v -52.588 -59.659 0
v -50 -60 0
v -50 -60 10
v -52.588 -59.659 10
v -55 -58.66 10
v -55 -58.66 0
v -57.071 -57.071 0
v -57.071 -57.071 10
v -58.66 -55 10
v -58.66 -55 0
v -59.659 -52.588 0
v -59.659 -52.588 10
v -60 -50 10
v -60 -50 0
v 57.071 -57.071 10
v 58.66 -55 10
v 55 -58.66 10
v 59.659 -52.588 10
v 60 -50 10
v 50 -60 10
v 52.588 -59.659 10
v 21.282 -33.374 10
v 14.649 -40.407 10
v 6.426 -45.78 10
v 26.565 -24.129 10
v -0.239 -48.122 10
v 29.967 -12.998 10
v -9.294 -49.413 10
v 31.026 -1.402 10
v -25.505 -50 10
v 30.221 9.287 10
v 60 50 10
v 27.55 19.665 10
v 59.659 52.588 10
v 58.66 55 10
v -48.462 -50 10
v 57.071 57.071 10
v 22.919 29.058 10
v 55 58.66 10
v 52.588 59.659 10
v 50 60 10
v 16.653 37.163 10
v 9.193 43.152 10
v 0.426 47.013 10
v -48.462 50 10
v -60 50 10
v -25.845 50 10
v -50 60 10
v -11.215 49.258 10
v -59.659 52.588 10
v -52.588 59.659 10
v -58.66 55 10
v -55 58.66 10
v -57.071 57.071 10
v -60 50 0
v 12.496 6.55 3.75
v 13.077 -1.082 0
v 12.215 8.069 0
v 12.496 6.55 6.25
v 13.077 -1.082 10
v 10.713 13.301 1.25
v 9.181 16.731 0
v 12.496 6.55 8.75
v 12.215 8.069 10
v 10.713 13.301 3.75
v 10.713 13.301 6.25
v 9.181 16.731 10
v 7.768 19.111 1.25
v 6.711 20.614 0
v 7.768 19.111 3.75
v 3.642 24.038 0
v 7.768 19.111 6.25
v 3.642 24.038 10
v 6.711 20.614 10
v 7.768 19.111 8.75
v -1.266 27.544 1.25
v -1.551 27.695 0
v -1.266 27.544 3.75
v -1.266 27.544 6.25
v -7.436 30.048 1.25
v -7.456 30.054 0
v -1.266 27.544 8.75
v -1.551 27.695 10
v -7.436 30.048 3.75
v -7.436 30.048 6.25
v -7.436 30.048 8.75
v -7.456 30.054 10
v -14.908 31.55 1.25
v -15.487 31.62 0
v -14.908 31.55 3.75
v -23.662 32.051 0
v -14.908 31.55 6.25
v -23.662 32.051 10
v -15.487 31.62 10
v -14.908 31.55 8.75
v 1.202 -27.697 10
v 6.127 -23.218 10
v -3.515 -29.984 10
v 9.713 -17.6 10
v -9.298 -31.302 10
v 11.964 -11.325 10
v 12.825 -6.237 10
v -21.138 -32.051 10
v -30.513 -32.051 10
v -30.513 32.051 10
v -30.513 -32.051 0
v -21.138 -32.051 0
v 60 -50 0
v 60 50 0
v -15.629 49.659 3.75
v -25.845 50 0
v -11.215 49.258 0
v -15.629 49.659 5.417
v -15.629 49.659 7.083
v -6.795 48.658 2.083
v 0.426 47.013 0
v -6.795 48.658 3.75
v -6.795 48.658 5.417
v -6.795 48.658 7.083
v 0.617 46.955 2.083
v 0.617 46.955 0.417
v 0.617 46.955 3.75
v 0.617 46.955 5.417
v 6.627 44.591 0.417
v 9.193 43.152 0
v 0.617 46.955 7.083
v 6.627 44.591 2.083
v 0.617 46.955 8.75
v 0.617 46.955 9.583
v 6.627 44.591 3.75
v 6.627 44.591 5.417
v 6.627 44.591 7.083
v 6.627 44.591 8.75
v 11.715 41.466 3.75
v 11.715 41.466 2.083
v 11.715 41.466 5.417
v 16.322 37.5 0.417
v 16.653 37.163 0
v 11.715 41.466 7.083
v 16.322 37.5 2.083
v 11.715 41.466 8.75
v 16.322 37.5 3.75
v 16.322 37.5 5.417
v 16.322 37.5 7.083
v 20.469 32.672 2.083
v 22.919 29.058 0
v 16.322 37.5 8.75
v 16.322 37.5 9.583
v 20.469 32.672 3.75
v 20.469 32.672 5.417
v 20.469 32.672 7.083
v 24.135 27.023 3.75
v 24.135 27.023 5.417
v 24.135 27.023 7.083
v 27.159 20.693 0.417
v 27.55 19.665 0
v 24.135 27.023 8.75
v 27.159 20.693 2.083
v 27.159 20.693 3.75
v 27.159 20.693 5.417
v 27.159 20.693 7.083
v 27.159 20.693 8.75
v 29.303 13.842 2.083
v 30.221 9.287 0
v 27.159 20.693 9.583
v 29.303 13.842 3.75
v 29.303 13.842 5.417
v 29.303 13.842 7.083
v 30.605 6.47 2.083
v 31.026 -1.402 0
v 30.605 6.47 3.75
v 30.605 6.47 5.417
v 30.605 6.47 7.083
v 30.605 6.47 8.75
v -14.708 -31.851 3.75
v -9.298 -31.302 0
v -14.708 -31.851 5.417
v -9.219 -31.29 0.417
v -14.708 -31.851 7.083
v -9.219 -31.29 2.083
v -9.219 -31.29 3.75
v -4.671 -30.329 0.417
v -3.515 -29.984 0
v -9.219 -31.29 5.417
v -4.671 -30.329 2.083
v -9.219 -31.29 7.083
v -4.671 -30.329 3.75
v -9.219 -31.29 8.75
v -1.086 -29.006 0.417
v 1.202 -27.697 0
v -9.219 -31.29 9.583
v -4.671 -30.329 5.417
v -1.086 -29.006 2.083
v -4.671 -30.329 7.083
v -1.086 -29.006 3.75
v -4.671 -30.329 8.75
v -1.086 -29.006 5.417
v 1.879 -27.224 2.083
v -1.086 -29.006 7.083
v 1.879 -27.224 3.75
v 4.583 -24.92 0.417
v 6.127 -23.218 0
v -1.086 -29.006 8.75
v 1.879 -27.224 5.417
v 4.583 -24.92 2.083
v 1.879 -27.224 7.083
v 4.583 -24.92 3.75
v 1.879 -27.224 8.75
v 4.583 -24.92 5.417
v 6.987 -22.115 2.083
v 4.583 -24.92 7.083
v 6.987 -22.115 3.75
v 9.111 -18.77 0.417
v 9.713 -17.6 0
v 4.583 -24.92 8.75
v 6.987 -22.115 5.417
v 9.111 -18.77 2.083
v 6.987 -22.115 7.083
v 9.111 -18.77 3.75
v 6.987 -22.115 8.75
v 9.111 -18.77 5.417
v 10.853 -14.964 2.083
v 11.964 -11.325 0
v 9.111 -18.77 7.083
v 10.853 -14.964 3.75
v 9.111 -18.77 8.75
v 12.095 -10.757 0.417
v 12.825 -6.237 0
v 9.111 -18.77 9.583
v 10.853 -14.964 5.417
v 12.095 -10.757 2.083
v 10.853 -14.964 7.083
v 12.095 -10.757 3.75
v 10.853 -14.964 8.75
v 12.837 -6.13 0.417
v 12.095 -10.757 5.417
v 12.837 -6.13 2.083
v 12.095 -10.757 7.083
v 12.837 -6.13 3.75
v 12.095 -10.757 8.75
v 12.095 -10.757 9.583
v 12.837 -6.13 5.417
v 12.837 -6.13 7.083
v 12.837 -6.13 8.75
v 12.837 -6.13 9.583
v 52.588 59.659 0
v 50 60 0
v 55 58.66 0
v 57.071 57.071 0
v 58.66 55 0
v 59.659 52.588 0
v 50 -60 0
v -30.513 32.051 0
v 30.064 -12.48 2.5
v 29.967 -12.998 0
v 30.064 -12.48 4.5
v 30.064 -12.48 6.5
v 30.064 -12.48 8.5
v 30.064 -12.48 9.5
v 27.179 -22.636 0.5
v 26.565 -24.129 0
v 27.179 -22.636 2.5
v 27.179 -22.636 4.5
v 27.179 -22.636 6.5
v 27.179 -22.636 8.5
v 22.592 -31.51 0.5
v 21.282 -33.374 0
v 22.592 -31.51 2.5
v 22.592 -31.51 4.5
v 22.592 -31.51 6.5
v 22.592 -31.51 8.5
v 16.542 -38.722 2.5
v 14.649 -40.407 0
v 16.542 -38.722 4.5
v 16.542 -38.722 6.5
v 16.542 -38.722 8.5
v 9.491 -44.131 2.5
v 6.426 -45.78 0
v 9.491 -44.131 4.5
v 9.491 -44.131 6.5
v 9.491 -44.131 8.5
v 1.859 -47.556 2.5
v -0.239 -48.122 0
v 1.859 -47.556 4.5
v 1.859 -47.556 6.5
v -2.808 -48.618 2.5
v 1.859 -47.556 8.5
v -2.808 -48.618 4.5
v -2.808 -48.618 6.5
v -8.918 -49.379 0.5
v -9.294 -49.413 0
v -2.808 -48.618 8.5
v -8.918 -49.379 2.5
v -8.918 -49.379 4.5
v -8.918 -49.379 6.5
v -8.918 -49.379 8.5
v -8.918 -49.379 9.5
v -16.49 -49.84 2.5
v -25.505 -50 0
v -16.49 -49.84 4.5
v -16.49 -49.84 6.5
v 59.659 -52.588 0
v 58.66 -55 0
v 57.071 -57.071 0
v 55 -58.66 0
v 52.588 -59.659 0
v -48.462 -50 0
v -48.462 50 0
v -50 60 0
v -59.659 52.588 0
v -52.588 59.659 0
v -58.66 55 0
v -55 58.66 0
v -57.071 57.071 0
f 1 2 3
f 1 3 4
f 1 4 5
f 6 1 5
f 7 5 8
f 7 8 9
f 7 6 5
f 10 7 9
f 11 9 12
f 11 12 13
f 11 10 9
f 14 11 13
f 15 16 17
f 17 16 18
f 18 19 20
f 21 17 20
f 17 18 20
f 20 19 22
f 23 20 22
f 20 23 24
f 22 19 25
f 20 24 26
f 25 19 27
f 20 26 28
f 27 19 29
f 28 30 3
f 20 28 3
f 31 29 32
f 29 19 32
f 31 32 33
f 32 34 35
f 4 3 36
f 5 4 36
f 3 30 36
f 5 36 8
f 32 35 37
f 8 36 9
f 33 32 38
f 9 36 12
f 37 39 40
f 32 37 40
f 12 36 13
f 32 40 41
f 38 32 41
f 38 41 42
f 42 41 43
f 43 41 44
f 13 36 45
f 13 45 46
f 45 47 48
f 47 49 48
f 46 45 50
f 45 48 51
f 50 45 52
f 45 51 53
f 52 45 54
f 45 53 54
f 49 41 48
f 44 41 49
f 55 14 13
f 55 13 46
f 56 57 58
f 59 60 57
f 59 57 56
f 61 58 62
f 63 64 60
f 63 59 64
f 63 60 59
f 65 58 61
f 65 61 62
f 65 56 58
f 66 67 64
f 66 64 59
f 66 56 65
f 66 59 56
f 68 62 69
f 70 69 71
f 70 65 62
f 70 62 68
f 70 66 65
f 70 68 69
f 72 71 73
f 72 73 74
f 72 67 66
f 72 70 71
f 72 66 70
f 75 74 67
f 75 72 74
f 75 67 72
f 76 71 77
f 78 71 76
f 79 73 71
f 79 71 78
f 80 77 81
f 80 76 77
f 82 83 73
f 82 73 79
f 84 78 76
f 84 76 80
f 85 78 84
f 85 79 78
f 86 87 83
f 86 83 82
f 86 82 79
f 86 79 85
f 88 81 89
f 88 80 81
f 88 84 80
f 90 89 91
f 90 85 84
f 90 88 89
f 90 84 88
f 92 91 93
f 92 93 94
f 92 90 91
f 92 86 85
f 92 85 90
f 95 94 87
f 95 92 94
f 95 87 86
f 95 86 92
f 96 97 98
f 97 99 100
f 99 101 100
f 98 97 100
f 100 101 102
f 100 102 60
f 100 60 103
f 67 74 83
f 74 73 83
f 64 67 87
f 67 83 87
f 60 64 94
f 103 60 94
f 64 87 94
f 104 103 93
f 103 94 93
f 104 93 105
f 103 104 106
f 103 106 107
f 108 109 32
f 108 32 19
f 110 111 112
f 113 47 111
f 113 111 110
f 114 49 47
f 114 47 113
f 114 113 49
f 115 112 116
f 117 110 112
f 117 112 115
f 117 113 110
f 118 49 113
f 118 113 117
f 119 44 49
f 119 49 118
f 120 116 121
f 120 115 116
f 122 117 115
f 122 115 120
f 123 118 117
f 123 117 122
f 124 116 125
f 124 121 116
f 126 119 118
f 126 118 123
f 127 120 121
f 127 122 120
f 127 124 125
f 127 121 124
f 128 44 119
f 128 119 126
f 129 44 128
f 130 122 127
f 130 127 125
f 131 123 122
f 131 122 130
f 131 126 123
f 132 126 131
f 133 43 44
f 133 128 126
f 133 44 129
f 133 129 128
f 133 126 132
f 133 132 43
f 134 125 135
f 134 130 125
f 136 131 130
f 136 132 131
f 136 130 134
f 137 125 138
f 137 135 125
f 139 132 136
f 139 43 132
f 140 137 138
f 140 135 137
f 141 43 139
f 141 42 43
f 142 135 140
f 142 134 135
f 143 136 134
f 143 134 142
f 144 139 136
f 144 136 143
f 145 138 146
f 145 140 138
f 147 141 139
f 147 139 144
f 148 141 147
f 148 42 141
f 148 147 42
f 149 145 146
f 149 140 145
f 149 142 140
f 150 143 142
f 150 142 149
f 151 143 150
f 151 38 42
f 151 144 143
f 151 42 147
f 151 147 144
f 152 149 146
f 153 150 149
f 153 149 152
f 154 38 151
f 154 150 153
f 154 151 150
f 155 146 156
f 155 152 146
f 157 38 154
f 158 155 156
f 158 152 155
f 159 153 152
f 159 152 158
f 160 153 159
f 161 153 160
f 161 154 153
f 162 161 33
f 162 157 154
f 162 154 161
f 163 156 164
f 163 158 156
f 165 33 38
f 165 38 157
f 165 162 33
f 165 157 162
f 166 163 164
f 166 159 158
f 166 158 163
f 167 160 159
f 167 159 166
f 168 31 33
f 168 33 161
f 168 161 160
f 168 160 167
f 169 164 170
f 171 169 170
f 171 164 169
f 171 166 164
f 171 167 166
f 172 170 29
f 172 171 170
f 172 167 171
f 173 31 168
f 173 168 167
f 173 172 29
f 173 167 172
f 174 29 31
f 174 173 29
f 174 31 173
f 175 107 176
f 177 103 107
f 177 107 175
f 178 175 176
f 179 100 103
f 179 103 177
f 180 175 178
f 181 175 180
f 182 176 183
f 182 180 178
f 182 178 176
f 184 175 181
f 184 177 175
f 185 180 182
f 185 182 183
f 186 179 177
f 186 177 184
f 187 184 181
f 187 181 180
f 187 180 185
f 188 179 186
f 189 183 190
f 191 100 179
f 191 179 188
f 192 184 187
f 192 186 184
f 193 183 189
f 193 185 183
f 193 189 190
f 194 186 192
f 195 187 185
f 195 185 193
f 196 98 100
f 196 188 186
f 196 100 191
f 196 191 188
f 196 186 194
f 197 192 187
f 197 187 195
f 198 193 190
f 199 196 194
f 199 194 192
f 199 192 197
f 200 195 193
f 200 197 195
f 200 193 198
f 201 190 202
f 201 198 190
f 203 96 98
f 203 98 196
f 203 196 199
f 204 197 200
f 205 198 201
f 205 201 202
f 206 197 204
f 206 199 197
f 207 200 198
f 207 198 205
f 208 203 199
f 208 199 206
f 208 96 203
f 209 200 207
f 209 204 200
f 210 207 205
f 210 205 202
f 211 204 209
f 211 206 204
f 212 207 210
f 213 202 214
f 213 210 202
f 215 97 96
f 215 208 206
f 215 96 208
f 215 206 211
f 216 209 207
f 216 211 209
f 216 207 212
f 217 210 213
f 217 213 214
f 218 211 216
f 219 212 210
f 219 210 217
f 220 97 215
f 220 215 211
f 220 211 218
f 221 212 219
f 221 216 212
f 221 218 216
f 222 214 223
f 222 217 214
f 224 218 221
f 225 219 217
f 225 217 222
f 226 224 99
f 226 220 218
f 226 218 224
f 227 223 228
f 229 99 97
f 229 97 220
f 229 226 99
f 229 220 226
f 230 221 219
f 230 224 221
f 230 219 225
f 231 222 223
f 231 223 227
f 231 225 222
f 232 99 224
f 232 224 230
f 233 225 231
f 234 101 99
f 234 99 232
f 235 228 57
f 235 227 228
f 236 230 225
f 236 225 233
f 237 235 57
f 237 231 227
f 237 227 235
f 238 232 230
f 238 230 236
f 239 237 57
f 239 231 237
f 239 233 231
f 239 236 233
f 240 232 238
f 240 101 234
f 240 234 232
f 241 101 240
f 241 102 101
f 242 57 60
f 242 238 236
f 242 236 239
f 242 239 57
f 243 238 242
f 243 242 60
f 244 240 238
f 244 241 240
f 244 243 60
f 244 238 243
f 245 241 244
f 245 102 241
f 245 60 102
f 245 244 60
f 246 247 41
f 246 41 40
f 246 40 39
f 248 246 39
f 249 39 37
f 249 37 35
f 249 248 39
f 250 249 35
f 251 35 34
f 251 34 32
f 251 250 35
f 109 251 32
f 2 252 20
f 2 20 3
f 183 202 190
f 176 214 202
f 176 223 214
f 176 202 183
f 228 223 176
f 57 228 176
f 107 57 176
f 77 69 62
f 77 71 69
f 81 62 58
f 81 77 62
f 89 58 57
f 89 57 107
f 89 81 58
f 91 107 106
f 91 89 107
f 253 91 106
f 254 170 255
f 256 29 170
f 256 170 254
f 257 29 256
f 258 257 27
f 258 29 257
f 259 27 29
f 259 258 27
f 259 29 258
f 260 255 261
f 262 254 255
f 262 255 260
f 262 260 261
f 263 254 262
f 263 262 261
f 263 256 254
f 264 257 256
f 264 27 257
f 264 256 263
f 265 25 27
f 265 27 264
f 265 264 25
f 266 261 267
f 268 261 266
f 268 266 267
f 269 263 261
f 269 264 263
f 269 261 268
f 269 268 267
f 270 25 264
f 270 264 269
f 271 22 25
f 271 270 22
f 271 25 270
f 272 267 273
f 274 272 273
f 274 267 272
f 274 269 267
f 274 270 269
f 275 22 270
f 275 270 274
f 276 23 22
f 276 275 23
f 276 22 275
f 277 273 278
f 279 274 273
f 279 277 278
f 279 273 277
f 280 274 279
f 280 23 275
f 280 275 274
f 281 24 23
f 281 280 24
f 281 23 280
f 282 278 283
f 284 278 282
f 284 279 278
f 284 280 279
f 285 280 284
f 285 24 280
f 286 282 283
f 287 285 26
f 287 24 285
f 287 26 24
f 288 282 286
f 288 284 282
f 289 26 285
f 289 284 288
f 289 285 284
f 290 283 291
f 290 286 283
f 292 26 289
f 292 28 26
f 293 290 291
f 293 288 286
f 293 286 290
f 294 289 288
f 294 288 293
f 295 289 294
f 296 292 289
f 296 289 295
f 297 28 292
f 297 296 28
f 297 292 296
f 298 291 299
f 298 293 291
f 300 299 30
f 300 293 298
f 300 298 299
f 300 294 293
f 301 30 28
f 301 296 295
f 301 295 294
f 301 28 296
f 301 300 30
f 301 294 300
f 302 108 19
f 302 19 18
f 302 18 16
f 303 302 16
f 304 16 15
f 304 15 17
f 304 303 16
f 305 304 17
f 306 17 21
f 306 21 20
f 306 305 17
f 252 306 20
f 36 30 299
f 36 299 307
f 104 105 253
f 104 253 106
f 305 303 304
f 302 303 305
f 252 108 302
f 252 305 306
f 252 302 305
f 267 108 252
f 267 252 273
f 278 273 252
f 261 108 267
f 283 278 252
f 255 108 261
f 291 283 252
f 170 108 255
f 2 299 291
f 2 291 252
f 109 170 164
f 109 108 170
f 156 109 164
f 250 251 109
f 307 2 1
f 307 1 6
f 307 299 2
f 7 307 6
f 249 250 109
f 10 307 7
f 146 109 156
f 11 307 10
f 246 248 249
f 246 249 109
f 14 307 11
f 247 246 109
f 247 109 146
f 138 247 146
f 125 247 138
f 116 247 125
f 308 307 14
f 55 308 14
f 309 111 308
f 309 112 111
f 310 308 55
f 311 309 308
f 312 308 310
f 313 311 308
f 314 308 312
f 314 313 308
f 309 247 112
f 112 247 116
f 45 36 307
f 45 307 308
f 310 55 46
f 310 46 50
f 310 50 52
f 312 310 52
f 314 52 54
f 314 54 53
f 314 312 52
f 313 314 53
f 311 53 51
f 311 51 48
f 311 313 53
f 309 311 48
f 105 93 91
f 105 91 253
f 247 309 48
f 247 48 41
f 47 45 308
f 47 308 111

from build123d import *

# Parameters (mm, degrees)
BOSS_EXTRUDE1_DEPTH = 10
CUT_EXTRUDE17_DEPTH = 10


with BuildPart() as part:
    # Sketch1 → Boss-Extrude1 (new body)
    with BuildSketch(Plane.XY):
        with BuildLine():
            Line((-50, 60), (50, 60))
            ThreePointArc((50, 60), (57.071067812, 57.071067812), (60, 50))
            Line((60, 50), (60, -50))
            ThreePointArc((60, -50), (57.071067812, -57.071067812), (50, -60))
            Line((50, -60), (-50, -60))
            ThreePointArc((-50, -60), (-57.071067812, -57.071067812), (-60, -50))
            Line((-60, -50), (-60, 50))
            ThreePointArc((-60, 50), (-57.071067812, 57.071067812), (-50, 60))
        make_face()
    extrude(amount=BOSS_EXTRUDE1_DEPTH)

    # Sketch2 → Cut-Extrude17 (cut)
    with BuildSketch(Plane.XY.offset(10)):
        with BuildLine():
            Line((-48.461538462, 50), (-25.845352564, 50))
            add(Edge.make_bspline(
                [(-25.845352564, 50), (-24.082160742, 49.987674686), (-20.673891012, 49.963849714), (-15.735982447, 49.695399577), (-11.144355841, 49.282542324), (-6.896051342, 48.714582352), (-2.999778658, 47.963015778), (0.539438041, 47.020322812), (3.733477219, 45.932140614), (6.617360853, 44.651673443), (9.250069228, 43.158775888), (11.749909855, 41.495807867), (14.111974354, 39.601850002), (16.369410563, 37.513440515), (18.49308579, 35.192372596), (20.518366839, 32.677091539), (22.395665633, 29.931122295), (24.181728861, 27.020304552), (25.796985387, 23.932302541), (27.205872485, 20.693400689), (28.386105749, 17.324442539), (29.345106395, 13.821837658), (30.109540588, 10.197213625), (30.644399787, 6.443256293), (30.975055072, 2.563441196), (31.008597286, -0.066099994), (31.025641026, -1.40224359)],
                knots=[0, 0, 0, 0, 1.44355588, 2.790409838, 4.047694926, 5.217575253, 6.298404546, 7.294384826, 8.214239204, 9.058592145, 9.873746385, 10.689560431, 11.514393297, 12.350027578, 13.205127629, 14.088021785, 14.991911688, 15.926770944, 16.882954281, 17.842803888, 18.816321264, 19.80318086, 20.814351908, 21.847355356, 22.906180909, 24, 24, 24, 24], degree=3))
            add(Edge.make_bspline(
                [(31.025641026, -1.40224359), (30.981011315, -3.287629175), (30.893155118, -6.999121063), (30.153103587, -12.445692648), (28.956189681, -17.666774746), (27.273220019, -22.621526024), (25.186788159, -27.265823698), (22.694311666, -31.51776752), (19.832336049, -35.354535213), (16.634203493, -38.757022818), (13.17140484, -41.681507029), (9.572858759, -44.18611374), (5.803508857, -46.161205126), (2.482184812, -47.413708419), (-0.397817491, -48.192657106), (-2.926428357, -48.653023281), (-5.7986723, -49.075206827), (-9.041330495, -49.401461191), (-12.640178109, -49.692399907), (-16.60956019, -49.850484682), (-20.936625018, -49.981829664), (-23.942180668, -49.993784518), (-25.504807692, -50)],
                knots=[0, 0, 0, 0, 1.315458931, 2.589557908, 3.828601765, 5.048913369, 6.235739168, 7.376350998, 8.481830359, 9.569842114, 10.627874879, 11.640079404, 12.624025415, 13.590060155, 14.111227486, 14.704434459, 15.382649715, 16.137166398, 16.978595427, 17.902333227, 18.909396075, 20, 20, 20, 20], degree=3))
            Line((-25.504807692, -50), (-48.461538462, -50))
            Line((-48.461538462, -50), (-48.461538462, 50))
        make_face()
        with BuildLine():
            Line((-30.512820513, 32.051282051), (-30.512820513, -32.051282051))
            Line((-30.512820513, -32.051282051), (-21.137820513, -32.051282051))
            add(Edge.make_bspline(
                [(-21.137820513, -32.051282051), (-20.022339491, -32.049238028), (-17.876898139, -32.045306691), (-14.779366471, -31.858053727), (-11.914935082, -31.670103388), (-9.291489078, -31.313367358), (-6.889935839, -30.915988524), (-4.743266416, -30.362981465), (-2.807228622, -29.782094397), (-1.10547079, -29.042553162), (0.453200729, -28.210150282), (1.896352519, -27.234893807), (3.289398046, -26.151908272), (4.606293203, -24.929341533), (5.852022118, -23.583382669), (7.019214274, -22.107096551), (8.123448597, -20.504987375), (9.136381479, -18.768584388), (10.062004971, -16.9162244), (10.883136731, -14.965850217), (11.563976126, -12.901219421), (12.129848148, -10.741659445), (12.534227872, -8.468368865), (12.868774965, -6.098185629), (13.04124374, -3.621719269), (13.064914004, -1.936648792), (13.076923077, -1.081730769)],
                knots=[0, 0, 0, 0, 1.50275155, 2.890291501, 4.180787663, 5.369391935, 6.45668281, 7.458360028, 8.354766181, 9.177074746, 9.954075863, 10.732690366, 11.5210699, 12.329727389, 13.151100085, 13.990027547, 14.863562427, 15.770965086, 16.696477834, 17.652329173, 18.619756807, 19.62365428, 20.657822005, 21.729286259, 22.847956731, 24, 24, 24, 24], degree=3))
            add(Edge.make_bspline(
                [(13.076923077, -1.081730769), (13.053005079, 0.228350281), (13.006366837, 2.78290682), (12.556597719, 6.503674179), (11.824459395, 10.007334043), (10.779768546, 13.280883392), (9.462903354, 16.333522618), (7.814539595, 19.139389398), (5.905616497, 21.745618433), (4.396092194, 23.274516009), (3.641826923, 24.038461538)],
                knots=[0, 0, 0, 0, 1.13821349, 2.219428113, 3.251817212, 4.244760574, 5.201143372, 6.134805572, 7.068016741, 8, 8, 8, 8], degree=3))
            add(Edge.make_bspline(
                [(3.641826923, 24.038461538), (2.898049947, 24.689446406), (1.378969693, 26.019009285), (-1.288036039, 27.612165629), (-4.226938227, 29.011909632), (-7.504970144, 30.121750526), (-11.090451066, 30.999460017), (-15.00473619, 31.604794791), (-19.226863674, 31.9937765), (-22.151855217, 32.031702865), (-23.661858974, 32.051282051)],
                knots=[0, 0, 0, 0, 0.813307809, 1.661089106, 2.549956539, 3.493439533, 4.508053171, 5.589449661, 6.755572447, 8, 8, 8, 8], degree=3))
            Line((-23.661858974, 32.051282051), (-30.512820513, 32.051282051))
        make_face(mode=Mode.SUBTRACT)
    extrude(amount=-CUT_EXTRUDE17_DEPTH, mode=Mode.SUBTRACT)


with BuildPart() as cut_extrude17_piece_1:
    # of the separate pieces the step leaves, piece 1, a body of its own (cut_extrude17_pieces)
    add(part.part.solids().sort_by_distance((-50, 60, 0))[0])


with BuildPart() as cut_extrude17_piece_2:
    # of the separate pieces the step leaves, piece 2, a body of its own (cut_extrude17_pieces)
    add(part.part.solids().sort_by_distance((-30.512820513, 32.051282051, 0))[0])


solid = Compound([cut_extrude17_piece_1.part, cut_extrude17_piece_2.part])
